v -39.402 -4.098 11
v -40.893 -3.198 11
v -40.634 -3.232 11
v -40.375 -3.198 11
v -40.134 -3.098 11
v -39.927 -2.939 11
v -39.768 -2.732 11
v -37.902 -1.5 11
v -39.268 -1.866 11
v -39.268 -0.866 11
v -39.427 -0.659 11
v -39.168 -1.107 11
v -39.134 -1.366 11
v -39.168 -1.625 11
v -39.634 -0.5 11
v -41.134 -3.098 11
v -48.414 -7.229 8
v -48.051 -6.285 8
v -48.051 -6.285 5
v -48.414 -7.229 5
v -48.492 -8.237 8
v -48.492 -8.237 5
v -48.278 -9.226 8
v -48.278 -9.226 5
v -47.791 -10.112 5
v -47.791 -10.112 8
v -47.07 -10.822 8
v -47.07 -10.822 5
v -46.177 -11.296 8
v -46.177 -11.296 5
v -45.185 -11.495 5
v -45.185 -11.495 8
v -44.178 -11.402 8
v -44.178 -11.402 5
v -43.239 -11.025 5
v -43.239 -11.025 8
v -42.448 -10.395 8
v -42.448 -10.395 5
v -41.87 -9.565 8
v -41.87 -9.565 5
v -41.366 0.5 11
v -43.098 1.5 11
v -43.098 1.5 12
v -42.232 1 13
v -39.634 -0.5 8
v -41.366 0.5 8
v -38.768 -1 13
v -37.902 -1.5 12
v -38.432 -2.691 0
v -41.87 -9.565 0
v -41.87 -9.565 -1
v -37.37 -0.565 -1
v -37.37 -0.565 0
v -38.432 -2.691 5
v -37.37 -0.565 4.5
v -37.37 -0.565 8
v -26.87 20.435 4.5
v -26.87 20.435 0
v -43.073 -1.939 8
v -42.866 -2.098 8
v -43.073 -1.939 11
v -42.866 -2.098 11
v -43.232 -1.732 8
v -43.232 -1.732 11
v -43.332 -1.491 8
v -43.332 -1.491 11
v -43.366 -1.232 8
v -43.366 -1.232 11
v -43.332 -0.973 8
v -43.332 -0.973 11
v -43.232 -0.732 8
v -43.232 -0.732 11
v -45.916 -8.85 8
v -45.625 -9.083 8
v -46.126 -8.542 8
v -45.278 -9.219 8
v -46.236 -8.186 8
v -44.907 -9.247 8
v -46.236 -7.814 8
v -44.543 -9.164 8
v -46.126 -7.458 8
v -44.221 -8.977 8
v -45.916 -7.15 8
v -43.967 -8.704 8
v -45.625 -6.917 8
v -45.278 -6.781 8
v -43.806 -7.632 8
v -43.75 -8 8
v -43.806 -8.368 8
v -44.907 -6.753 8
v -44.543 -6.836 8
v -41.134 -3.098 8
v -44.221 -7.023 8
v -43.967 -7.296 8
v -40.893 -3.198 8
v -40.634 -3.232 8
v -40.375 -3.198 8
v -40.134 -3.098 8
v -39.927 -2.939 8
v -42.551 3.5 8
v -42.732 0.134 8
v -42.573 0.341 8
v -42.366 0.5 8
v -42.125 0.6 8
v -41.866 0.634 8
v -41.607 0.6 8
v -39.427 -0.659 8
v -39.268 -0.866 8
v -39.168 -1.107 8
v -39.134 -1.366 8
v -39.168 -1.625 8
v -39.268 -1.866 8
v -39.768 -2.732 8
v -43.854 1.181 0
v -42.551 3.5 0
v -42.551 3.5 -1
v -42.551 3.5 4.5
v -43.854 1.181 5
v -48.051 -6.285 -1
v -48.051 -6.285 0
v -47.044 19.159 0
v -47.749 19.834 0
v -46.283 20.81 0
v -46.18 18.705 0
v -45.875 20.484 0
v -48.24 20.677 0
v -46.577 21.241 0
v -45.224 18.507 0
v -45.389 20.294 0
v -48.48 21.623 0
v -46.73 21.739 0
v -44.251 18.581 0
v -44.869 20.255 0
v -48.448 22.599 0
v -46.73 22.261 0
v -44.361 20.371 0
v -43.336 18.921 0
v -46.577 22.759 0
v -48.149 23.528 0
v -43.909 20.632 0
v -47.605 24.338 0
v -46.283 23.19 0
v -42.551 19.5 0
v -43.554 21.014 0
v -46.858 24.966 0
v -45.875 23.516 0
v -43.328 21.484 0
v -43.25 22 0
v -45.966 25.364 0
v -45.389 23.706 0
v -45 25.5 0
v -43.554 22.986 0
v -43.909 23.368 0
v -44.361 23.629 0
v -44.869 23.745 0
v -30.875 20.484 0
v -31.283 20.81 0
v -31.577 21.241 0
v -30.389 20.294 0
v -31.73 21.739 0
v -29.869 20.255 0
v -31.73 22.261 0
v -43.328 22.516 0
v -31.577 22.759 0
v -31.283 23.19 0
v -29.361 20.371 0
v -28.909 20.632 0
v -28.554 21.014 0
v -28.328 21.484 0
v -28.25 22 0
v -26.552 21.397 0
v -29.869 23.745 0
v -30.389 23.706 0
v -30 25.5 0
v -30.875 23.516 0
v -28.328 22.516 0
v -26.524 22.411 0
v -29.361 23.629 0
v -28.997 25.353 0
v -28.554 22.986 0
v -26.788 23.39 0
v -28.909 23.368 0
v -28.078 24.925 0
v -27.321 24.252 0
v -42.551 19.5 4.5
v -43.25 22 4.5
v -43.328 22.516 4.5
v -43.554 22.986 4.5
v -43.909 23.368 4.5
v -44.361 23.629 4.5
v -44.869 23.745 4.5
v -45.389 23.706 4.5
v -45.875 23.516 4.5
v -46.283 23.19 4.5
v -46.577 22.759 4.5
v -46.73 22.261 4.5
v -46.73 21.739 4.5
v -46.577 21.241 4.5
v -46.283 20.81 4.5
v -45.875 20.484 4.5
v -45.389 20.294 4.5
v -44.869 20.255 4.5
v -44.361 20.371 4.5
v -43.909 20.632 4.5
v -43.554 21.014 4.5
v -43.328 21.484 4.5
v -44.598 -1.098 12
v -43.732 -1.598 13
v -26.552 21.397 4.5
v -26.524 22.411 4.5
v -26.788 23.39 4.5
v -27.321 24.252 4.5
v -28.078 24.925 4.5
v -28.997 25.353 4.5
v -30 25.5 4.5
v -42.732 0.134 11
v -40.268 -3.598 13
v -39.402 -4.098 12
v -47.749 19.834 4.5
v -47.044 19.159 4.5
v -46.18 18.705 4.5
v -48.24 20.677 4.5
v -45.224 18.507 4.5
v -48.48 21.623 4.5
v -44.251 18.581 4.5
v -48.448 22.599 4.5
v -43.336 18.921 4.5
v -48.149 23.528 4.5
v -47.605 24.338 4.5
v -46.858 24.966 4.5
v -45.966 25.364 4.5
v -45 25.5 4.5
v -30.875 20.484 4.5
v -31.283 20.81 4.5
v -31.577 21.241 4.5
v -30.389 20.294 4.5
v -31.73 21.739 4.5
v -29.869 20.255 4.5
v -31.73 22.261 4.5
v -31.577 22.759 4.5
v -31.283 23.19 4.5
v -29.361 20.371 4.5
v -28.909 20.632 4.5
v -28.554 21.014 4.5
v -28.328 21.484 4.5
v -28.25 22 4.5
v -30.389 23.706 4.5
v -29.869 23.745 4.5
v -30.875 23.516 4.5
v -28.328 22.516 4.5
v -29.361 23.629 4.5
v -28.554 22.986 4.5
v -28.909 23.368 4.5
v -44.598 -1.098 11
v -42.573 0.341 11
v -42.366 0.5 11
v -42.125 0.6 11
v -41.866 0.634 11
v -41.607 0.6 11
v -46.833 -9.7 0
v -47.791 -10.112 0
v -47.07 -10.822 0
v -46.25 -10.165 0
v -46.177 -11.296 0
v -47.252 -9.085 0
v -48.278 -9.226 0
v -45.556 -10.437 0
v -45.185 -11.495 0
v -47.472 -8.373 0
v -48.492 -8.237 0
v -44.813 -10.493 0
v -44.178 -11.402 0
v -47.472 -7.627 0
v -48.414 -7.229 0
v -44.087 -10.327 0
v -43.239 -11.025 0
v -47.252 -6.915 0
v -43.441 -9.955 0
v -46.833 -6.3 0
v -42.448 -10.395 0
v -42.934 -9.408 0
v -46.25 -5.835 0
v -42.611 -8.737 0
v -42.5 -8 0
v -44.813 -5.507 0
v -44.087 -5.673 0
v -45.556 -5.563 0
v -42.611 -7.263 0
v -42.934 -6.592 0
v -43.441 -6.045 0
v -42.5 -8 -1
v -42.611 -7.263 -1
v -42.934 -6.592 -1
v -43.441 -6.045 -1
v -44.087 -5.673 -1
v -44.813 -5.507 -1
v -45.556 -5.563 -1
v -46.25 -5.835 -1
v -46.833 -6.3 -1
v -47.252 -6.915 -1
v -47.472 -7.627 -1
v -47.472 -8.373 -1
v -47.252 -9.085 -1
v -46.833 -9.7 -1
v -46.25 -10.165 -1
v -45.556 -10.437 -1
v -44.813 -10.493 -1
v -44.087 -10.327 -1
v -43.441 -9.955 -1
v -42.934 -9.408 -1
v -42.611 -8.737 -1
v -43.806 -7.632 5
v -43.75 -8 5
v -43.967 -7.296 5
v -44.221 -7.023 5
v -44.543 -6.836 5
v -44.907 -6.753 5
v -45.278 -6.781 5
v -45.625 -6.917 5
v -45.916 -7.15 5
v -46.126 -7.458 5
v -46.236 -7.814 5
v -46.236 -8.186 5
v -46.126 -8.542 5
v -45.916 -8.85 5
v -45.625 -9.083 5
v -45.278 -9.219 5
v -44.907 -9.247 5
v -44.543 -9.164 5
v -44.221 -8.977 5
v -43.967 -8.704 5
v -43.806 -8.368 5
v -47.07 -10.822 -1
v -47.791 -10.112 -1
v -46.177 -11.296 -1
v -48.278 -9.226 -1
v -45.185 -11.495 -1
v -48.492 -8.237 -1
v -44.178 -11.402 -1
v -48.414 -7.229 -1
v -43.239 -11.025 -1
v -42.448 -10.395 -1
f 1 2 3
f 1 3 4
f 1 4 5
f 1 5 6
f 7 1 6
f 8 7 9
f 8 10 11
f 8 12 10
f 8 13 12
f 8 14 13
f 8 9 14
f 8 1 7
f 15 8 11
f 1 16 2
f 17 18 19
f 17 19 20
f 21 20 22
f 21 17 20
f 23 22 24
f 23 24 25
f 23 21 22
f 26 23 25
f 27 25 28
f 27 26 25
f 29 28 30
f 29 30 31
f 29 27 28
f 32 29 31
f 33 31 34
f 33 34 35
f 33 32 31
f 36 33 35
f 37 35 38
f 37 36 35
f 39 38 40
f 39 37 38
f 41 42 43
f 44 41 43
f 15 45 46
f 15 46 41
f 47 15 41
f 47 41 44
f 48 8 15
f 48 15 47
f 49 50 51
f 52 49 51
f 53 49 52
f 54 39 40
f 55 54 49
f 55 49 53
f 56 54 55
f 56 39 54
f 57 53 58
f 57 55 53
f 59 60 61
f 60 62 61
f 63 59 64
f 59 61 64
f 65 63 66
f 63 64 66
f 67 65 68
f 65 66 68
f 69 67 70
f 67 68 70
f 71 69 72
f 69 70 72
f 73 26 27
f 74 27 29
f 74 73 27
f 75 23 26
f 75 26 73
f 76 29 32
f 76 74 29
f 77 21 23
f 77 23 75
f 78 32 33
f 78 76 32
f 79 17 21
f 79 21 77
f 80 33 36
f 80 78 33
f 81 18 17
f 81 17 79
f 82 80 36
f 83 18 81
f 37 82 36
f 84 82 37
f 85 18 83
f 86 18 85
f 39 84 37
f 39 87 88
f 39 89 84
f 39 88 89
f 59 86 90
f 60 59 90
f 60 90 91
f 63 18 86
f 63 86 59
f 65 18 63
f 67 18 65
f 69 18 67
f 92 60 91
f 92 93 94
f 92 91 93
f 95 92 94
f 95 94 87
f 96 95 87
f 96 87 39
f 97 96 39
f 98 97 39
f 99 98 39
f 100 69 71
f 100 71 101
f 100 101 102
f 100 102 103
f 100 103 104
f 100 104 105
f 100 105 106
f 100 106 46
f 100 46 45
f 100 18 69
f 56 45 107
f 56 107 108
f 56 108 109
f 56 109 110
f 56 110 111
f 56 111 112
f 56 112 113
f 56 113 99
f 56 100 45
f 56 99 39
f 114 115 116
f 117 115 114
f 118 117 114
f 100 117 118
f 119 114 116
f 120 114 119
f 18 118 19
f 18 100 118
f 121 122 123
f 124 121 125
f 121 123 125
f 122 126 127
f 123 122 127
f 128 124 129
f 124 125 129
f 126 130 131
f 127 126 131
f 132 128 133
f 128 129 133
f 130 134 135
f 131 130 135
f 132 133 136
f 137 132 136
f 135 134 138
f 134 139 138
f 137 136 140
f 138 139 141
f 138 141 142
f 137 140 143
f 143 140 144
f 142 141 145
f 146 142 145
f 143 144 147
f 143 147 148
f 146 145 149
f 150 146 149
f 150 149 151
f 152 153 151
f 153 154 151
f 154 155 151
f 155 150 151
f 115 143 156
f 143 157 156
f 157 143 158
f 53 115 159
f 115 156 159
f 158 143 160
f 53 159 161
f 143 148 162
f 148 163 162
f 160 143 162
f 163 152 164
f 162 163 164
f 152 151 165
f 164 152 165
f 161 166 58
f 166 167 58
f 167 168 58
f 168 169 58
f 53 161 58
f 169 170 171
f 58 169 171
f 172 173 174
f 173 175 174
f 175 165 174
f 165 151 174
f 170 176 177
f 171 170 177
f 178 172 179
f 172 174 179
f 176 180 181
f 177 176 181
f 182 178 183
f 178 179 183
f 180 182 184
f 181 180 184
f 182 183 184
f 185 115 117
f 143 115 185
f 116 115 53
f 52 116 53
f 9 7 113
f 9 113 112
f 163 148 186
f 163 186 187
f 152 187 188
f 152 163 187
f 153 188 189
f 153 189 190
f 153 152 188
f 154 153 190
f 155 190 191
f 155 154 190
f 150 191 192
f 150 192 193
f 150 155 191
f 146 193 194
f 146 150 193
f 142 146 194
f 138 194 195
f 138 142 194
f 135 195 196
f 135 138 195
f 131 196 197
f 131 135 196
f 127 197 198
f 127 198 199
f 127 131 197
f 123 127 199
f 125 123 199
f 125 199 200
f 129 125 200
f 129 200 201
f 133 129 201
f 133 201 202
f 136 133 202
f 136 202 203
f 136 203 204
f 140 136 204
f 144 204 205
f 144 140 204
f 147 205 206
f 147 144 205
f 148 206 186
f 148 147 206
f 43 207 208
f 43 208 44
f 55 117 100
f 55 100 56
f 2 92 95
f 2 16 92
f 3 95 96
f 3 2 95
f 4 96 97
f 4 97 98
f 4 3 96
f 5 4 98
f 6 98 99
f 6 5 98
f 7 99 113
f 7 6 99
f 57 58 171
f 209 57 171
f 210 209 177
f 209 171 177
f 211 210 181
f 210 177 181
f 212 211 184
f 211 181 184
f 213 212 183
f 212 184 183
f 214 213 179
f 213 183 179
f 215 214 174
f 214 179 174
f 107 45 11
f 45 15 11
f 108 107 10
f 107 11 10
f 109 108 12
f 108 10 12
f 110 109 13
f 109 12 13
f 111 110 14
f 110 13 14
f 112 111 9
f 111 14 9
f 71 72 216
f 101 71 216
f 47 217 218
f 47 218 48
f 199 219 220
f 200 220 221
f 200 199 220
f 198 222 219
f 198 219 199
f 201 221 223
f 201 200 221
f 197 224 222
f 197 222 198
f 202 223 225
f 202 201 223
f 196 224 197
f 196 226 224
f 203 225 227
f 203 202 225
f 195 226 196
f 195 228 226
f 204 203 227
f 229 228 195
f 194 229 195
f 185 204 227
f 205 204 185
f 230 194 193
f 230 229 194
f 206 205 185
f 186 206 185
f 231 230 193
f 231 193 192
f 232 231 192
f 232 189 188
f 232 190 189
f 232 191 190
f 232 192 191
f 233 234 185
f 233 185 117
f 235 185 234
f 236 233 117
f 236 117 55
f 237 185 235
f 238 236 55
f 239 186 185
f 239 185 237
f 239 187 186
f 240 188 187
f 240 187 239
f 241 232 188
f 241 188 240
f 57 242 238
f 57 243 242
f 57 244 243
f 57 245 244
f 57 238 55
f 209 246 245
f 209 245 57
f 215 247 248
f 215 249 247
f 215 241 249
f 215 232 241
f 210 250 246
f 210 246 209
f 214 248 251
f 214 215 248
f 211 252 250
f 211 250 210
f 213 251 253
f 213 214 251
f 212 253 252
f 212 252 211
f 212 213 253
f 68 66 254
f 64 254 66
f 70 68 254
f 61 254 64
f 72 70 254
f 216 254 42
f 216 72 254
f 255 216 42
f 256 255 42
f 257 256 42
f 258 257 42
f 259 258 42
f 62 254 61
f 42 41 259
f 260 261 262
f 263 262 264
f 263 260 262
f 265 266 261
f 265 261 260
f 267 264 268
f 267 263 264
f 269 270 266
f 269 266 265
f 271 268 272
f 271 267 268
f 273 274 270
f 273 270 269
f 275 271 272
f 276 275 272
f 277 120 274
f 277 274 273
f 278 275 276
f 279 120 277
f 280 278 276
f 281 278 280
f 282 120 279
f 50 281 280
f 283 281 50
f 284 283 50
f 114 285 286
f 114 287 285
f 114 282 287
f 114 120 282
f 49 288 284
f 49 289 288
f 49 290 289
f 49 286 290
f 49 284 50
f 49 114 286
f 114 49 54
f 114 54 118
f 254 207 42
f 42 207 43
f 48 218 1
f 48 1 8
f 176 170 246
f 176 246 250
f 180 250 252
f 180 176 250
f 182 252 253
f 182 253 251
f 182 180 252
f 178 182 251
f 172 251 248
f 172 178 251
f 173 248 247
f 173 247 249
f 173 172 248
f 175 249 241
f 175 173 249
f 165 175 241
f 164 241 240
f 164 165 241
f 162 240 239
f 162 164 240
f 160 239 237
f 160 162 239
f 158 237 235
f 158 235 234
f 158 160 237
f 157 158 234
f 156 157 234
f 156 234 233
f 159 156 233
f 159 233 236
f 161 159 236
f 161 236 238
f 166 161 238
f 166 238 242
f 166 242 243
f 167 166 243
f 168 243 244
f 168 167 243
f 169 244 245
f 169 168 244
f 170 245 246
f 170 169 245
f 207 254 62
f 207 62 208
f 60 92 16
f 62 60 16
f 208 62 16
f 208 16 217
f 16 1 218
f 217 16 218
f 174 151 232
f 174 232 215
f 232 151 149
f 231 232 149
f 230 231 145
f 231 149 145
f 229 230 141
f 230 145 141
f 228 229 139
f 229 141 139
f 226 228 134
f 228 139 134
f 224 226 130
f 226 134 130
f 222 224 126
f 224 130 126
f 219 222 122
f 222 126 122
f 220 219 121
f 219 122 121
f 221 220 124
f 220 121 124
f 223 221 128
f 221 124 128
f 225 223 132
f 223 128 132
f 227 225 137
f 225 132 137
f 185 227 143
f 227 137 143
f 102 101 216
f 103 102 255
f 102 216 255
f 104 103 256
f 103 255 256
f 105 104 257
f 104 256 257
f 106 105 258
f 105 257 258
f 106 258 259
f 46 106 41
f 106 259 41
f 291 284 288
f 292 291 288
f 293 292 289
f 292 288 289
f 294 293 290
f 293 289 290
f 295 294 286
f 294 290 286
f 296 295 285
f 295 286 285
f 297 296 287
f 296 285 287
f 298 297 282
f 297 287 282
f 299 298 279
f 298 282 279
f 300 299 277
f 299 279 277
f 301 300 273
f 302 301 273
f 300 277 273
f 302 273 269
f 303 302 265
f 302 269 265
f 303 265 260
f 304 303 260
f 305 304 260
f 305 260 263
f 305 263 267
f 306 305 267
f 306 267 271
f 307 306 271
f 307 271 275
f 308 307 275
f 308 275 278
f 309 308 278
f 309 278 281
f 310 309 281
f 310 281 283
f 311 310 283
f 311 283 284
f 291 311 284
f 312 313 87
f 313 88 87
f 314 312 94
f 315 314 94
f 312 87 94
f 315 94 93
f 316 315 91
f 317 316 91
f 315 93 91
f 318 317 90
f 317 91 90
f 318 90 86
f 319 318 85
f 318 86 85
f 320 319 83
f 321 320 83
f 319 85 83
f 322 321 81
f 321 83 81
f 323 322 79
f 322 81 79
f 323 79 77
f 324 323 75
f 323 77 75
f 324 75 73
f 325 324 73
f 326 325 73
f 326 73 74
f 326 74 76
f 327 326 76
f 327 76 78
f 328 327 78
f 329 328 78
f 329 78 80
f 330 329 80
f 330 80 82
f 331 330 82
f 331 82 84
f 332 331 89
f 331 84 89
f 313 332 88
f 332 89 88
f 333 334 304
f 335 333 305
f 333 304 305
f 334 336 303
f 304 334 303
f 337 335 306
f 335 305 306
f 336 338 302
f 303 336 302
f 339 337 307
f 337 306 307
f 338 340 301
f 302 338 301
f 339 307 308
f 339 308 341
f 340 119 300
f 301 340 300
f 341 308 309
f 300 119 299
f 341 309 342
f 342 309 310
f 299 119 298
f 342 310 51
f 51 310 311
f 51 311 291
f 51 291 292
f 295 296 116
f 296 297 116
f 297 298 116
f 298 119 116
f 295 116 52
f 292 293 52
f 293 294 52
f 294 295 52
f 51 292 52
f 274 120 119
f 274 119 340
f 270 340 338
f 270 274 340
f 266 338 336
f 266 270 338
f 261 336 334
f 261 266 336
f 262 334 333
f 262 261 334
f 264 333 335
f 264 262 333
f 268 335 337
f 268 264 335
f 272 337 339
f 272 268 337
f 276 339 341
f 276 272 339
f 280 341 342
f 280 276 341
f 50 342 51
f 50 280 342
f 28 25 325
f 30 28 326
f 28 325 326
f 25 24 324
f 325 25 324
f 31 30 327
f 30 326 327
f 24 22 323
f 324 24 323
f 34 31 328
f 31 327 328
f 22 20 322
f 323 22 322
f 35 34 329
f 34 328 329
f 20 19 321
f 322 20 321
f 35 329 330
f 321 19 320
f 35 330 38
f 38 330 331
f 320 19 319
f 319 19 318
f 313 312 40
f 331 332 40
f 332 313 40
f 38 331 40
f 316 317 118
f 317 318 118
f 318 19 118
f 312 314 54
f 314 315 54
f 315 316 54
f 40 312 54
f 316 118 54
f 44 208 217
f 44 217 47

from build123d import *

# Parameters (mm, degrees)
SKETCH012_R       = 1.75
SKETCH012_R_2     = 1.25
PAD006_DEPTH      = 4.5
SKETCH050_R       = 1.25
PAD023_DEPTH      = 8
PAD023_DEPTH_BACK = 1
POCKET022_DEPTH   = 5
SKETCH080_R       = 2.5
POCKET031_DEPTH   = 5
SKETCH081_W       = 3
SKETCH081_H       = 5
PAD044_DEPTH      = 2
SKETCH082_W       = 3
SKETCH082_H       = 2
PAD045_DEPTH      = 3
FILLET007_R       = 1
CHAMFER001_SIZE   = 1


with BuildPart() as part:
    # Sketch012 → Pad006 (new body)
    with BuildSketch(Plane.XY):
        with BuildLine():
            ThreePointArc((2.44949, -27.5), (-3.451901, -30.578258), (3.130495, -31.565248))
            Line((3.130495, -31.565248), (18.130495, -1.565248))
            ThreePointArc((18.130495, -1.565248), (17.977278, 1.840059), (15, 3.5))
            Line((0, 3.5), (15, 3.5))
            ThreePointArc((0, 3.5), (-3.24037, -1.322876), (2.44949, -2.5))
            Line((2.44949, -27.5), (2.44949, -2.5))
        make_face()
        Circle(SKETCH012_R, mode=Mode.SUBTRACT)
        with Locations((0, -30)):
            Circle(SKETCH012_R_2, mode=Mode.SUBTRACT)
        with Locations((15, 0)):
            Circle(SKETCH012_R, mode=Mode.SUBTRACT)
    extrude(amount=PAD006_DEPTH)

    # Sketch050 → Pad023 (join, two sides)
    with BuildSketch(Plane.XY) as pad023_sk:
        with BuildLine():
            Line((2.44949, -18.5), (-3.050986, -28.284925))
            ThreePointArc((-3.050986, -28.284925), (-1.640643, -33.091649), (3.130495, -31.565248))
            Line((3.130495, -31.565248), (7.630495, -22.565248))
            Line((2.44949, -18.5), (7.630495, -22.565248))
        make_face()
        with Locations((0, -30)):
            Circle(SKETCH050_R, mode=Mode.SUBTRACT)
    extrude(amount=PAD023_DEPTH)
    extrude(pad023_sk.sketch, amount=-PAD023_DEPTH_BACK)

    # Sketch051 → Pocket022 (cut)
    with BuildSketch(Plane.XY):
        Polygon((0, -35), (7, -35), (7, -25), (0, -20), (-4, -20), (-4, -35), align=None)
    extrude(amount=POCKET022_DEPTH, mode=Mode.SUBTRACT)

    # Sketch080 → Pocket031 (cut)
    with BuildSketch(Plane(origin=(0, -30, 0), x_dir=(1, 0, 0), z_dir=(0, 0, 1))):
        Circle(SKETCH080_R)
    extrude(amount=-POCKET031_DEPTH, mode=Mode.SUBTRACT)

    # Sketch081 → Pad044 (join, symmetric)
    with BuildSketch(Plane(origin=(4.5, -22, 8), x_dir=(0.5, 0.866025, 0), z_dir=(0.866025, -0.5, 0))):
        with Locations((-1.5, 2.5)):
            Rectangle(SKETCH081_W, SKETCH081_H)
    extrude(amount=PAD044_DEPTH, both=True)

    # Sketch082 → Pad045 (join, symmetric)
    with BuildSketch(Plane(origin=(4.5, -22, 11), x_dir=(0.5, 0.866025, 0), z_dir=(0.866025, -0.5, 0))):
        with Locations((-1.5, 1)):
            Rectangle(SKETCH082_W, SKETCH082_H)
    extrude(amount=PAD045_DEPTH, both=True)

    # Fillet007
    fillet007_edges = [part.edges().sort_by_distance(p)[0] for p in [
        (1.267949, -23.598076, 9.5),
        (2.767949, -21, 9.5),
        (6.232051, -23, 9.5),
        (4.732051, -25.598076, 9.5),
    ]]
    fillet(fillet007_edges, radius=FILLET007_R)

    # Chamfer001
    chamfer001_edges = [part.edges().sort_by_distance(p)[0] for p in [
        (6.348076, -24.799038, 13),
        (1.151924, -21.799038, 13),
    ]]
    chamfer(chamfer001_edges, length=CHAMFER001_SIZE)


with BuildPart() as part_1:
    # Body004 placement: moved
    add(part.part.moved(Location((-45, 22, 0))))


solid = part_1.part
